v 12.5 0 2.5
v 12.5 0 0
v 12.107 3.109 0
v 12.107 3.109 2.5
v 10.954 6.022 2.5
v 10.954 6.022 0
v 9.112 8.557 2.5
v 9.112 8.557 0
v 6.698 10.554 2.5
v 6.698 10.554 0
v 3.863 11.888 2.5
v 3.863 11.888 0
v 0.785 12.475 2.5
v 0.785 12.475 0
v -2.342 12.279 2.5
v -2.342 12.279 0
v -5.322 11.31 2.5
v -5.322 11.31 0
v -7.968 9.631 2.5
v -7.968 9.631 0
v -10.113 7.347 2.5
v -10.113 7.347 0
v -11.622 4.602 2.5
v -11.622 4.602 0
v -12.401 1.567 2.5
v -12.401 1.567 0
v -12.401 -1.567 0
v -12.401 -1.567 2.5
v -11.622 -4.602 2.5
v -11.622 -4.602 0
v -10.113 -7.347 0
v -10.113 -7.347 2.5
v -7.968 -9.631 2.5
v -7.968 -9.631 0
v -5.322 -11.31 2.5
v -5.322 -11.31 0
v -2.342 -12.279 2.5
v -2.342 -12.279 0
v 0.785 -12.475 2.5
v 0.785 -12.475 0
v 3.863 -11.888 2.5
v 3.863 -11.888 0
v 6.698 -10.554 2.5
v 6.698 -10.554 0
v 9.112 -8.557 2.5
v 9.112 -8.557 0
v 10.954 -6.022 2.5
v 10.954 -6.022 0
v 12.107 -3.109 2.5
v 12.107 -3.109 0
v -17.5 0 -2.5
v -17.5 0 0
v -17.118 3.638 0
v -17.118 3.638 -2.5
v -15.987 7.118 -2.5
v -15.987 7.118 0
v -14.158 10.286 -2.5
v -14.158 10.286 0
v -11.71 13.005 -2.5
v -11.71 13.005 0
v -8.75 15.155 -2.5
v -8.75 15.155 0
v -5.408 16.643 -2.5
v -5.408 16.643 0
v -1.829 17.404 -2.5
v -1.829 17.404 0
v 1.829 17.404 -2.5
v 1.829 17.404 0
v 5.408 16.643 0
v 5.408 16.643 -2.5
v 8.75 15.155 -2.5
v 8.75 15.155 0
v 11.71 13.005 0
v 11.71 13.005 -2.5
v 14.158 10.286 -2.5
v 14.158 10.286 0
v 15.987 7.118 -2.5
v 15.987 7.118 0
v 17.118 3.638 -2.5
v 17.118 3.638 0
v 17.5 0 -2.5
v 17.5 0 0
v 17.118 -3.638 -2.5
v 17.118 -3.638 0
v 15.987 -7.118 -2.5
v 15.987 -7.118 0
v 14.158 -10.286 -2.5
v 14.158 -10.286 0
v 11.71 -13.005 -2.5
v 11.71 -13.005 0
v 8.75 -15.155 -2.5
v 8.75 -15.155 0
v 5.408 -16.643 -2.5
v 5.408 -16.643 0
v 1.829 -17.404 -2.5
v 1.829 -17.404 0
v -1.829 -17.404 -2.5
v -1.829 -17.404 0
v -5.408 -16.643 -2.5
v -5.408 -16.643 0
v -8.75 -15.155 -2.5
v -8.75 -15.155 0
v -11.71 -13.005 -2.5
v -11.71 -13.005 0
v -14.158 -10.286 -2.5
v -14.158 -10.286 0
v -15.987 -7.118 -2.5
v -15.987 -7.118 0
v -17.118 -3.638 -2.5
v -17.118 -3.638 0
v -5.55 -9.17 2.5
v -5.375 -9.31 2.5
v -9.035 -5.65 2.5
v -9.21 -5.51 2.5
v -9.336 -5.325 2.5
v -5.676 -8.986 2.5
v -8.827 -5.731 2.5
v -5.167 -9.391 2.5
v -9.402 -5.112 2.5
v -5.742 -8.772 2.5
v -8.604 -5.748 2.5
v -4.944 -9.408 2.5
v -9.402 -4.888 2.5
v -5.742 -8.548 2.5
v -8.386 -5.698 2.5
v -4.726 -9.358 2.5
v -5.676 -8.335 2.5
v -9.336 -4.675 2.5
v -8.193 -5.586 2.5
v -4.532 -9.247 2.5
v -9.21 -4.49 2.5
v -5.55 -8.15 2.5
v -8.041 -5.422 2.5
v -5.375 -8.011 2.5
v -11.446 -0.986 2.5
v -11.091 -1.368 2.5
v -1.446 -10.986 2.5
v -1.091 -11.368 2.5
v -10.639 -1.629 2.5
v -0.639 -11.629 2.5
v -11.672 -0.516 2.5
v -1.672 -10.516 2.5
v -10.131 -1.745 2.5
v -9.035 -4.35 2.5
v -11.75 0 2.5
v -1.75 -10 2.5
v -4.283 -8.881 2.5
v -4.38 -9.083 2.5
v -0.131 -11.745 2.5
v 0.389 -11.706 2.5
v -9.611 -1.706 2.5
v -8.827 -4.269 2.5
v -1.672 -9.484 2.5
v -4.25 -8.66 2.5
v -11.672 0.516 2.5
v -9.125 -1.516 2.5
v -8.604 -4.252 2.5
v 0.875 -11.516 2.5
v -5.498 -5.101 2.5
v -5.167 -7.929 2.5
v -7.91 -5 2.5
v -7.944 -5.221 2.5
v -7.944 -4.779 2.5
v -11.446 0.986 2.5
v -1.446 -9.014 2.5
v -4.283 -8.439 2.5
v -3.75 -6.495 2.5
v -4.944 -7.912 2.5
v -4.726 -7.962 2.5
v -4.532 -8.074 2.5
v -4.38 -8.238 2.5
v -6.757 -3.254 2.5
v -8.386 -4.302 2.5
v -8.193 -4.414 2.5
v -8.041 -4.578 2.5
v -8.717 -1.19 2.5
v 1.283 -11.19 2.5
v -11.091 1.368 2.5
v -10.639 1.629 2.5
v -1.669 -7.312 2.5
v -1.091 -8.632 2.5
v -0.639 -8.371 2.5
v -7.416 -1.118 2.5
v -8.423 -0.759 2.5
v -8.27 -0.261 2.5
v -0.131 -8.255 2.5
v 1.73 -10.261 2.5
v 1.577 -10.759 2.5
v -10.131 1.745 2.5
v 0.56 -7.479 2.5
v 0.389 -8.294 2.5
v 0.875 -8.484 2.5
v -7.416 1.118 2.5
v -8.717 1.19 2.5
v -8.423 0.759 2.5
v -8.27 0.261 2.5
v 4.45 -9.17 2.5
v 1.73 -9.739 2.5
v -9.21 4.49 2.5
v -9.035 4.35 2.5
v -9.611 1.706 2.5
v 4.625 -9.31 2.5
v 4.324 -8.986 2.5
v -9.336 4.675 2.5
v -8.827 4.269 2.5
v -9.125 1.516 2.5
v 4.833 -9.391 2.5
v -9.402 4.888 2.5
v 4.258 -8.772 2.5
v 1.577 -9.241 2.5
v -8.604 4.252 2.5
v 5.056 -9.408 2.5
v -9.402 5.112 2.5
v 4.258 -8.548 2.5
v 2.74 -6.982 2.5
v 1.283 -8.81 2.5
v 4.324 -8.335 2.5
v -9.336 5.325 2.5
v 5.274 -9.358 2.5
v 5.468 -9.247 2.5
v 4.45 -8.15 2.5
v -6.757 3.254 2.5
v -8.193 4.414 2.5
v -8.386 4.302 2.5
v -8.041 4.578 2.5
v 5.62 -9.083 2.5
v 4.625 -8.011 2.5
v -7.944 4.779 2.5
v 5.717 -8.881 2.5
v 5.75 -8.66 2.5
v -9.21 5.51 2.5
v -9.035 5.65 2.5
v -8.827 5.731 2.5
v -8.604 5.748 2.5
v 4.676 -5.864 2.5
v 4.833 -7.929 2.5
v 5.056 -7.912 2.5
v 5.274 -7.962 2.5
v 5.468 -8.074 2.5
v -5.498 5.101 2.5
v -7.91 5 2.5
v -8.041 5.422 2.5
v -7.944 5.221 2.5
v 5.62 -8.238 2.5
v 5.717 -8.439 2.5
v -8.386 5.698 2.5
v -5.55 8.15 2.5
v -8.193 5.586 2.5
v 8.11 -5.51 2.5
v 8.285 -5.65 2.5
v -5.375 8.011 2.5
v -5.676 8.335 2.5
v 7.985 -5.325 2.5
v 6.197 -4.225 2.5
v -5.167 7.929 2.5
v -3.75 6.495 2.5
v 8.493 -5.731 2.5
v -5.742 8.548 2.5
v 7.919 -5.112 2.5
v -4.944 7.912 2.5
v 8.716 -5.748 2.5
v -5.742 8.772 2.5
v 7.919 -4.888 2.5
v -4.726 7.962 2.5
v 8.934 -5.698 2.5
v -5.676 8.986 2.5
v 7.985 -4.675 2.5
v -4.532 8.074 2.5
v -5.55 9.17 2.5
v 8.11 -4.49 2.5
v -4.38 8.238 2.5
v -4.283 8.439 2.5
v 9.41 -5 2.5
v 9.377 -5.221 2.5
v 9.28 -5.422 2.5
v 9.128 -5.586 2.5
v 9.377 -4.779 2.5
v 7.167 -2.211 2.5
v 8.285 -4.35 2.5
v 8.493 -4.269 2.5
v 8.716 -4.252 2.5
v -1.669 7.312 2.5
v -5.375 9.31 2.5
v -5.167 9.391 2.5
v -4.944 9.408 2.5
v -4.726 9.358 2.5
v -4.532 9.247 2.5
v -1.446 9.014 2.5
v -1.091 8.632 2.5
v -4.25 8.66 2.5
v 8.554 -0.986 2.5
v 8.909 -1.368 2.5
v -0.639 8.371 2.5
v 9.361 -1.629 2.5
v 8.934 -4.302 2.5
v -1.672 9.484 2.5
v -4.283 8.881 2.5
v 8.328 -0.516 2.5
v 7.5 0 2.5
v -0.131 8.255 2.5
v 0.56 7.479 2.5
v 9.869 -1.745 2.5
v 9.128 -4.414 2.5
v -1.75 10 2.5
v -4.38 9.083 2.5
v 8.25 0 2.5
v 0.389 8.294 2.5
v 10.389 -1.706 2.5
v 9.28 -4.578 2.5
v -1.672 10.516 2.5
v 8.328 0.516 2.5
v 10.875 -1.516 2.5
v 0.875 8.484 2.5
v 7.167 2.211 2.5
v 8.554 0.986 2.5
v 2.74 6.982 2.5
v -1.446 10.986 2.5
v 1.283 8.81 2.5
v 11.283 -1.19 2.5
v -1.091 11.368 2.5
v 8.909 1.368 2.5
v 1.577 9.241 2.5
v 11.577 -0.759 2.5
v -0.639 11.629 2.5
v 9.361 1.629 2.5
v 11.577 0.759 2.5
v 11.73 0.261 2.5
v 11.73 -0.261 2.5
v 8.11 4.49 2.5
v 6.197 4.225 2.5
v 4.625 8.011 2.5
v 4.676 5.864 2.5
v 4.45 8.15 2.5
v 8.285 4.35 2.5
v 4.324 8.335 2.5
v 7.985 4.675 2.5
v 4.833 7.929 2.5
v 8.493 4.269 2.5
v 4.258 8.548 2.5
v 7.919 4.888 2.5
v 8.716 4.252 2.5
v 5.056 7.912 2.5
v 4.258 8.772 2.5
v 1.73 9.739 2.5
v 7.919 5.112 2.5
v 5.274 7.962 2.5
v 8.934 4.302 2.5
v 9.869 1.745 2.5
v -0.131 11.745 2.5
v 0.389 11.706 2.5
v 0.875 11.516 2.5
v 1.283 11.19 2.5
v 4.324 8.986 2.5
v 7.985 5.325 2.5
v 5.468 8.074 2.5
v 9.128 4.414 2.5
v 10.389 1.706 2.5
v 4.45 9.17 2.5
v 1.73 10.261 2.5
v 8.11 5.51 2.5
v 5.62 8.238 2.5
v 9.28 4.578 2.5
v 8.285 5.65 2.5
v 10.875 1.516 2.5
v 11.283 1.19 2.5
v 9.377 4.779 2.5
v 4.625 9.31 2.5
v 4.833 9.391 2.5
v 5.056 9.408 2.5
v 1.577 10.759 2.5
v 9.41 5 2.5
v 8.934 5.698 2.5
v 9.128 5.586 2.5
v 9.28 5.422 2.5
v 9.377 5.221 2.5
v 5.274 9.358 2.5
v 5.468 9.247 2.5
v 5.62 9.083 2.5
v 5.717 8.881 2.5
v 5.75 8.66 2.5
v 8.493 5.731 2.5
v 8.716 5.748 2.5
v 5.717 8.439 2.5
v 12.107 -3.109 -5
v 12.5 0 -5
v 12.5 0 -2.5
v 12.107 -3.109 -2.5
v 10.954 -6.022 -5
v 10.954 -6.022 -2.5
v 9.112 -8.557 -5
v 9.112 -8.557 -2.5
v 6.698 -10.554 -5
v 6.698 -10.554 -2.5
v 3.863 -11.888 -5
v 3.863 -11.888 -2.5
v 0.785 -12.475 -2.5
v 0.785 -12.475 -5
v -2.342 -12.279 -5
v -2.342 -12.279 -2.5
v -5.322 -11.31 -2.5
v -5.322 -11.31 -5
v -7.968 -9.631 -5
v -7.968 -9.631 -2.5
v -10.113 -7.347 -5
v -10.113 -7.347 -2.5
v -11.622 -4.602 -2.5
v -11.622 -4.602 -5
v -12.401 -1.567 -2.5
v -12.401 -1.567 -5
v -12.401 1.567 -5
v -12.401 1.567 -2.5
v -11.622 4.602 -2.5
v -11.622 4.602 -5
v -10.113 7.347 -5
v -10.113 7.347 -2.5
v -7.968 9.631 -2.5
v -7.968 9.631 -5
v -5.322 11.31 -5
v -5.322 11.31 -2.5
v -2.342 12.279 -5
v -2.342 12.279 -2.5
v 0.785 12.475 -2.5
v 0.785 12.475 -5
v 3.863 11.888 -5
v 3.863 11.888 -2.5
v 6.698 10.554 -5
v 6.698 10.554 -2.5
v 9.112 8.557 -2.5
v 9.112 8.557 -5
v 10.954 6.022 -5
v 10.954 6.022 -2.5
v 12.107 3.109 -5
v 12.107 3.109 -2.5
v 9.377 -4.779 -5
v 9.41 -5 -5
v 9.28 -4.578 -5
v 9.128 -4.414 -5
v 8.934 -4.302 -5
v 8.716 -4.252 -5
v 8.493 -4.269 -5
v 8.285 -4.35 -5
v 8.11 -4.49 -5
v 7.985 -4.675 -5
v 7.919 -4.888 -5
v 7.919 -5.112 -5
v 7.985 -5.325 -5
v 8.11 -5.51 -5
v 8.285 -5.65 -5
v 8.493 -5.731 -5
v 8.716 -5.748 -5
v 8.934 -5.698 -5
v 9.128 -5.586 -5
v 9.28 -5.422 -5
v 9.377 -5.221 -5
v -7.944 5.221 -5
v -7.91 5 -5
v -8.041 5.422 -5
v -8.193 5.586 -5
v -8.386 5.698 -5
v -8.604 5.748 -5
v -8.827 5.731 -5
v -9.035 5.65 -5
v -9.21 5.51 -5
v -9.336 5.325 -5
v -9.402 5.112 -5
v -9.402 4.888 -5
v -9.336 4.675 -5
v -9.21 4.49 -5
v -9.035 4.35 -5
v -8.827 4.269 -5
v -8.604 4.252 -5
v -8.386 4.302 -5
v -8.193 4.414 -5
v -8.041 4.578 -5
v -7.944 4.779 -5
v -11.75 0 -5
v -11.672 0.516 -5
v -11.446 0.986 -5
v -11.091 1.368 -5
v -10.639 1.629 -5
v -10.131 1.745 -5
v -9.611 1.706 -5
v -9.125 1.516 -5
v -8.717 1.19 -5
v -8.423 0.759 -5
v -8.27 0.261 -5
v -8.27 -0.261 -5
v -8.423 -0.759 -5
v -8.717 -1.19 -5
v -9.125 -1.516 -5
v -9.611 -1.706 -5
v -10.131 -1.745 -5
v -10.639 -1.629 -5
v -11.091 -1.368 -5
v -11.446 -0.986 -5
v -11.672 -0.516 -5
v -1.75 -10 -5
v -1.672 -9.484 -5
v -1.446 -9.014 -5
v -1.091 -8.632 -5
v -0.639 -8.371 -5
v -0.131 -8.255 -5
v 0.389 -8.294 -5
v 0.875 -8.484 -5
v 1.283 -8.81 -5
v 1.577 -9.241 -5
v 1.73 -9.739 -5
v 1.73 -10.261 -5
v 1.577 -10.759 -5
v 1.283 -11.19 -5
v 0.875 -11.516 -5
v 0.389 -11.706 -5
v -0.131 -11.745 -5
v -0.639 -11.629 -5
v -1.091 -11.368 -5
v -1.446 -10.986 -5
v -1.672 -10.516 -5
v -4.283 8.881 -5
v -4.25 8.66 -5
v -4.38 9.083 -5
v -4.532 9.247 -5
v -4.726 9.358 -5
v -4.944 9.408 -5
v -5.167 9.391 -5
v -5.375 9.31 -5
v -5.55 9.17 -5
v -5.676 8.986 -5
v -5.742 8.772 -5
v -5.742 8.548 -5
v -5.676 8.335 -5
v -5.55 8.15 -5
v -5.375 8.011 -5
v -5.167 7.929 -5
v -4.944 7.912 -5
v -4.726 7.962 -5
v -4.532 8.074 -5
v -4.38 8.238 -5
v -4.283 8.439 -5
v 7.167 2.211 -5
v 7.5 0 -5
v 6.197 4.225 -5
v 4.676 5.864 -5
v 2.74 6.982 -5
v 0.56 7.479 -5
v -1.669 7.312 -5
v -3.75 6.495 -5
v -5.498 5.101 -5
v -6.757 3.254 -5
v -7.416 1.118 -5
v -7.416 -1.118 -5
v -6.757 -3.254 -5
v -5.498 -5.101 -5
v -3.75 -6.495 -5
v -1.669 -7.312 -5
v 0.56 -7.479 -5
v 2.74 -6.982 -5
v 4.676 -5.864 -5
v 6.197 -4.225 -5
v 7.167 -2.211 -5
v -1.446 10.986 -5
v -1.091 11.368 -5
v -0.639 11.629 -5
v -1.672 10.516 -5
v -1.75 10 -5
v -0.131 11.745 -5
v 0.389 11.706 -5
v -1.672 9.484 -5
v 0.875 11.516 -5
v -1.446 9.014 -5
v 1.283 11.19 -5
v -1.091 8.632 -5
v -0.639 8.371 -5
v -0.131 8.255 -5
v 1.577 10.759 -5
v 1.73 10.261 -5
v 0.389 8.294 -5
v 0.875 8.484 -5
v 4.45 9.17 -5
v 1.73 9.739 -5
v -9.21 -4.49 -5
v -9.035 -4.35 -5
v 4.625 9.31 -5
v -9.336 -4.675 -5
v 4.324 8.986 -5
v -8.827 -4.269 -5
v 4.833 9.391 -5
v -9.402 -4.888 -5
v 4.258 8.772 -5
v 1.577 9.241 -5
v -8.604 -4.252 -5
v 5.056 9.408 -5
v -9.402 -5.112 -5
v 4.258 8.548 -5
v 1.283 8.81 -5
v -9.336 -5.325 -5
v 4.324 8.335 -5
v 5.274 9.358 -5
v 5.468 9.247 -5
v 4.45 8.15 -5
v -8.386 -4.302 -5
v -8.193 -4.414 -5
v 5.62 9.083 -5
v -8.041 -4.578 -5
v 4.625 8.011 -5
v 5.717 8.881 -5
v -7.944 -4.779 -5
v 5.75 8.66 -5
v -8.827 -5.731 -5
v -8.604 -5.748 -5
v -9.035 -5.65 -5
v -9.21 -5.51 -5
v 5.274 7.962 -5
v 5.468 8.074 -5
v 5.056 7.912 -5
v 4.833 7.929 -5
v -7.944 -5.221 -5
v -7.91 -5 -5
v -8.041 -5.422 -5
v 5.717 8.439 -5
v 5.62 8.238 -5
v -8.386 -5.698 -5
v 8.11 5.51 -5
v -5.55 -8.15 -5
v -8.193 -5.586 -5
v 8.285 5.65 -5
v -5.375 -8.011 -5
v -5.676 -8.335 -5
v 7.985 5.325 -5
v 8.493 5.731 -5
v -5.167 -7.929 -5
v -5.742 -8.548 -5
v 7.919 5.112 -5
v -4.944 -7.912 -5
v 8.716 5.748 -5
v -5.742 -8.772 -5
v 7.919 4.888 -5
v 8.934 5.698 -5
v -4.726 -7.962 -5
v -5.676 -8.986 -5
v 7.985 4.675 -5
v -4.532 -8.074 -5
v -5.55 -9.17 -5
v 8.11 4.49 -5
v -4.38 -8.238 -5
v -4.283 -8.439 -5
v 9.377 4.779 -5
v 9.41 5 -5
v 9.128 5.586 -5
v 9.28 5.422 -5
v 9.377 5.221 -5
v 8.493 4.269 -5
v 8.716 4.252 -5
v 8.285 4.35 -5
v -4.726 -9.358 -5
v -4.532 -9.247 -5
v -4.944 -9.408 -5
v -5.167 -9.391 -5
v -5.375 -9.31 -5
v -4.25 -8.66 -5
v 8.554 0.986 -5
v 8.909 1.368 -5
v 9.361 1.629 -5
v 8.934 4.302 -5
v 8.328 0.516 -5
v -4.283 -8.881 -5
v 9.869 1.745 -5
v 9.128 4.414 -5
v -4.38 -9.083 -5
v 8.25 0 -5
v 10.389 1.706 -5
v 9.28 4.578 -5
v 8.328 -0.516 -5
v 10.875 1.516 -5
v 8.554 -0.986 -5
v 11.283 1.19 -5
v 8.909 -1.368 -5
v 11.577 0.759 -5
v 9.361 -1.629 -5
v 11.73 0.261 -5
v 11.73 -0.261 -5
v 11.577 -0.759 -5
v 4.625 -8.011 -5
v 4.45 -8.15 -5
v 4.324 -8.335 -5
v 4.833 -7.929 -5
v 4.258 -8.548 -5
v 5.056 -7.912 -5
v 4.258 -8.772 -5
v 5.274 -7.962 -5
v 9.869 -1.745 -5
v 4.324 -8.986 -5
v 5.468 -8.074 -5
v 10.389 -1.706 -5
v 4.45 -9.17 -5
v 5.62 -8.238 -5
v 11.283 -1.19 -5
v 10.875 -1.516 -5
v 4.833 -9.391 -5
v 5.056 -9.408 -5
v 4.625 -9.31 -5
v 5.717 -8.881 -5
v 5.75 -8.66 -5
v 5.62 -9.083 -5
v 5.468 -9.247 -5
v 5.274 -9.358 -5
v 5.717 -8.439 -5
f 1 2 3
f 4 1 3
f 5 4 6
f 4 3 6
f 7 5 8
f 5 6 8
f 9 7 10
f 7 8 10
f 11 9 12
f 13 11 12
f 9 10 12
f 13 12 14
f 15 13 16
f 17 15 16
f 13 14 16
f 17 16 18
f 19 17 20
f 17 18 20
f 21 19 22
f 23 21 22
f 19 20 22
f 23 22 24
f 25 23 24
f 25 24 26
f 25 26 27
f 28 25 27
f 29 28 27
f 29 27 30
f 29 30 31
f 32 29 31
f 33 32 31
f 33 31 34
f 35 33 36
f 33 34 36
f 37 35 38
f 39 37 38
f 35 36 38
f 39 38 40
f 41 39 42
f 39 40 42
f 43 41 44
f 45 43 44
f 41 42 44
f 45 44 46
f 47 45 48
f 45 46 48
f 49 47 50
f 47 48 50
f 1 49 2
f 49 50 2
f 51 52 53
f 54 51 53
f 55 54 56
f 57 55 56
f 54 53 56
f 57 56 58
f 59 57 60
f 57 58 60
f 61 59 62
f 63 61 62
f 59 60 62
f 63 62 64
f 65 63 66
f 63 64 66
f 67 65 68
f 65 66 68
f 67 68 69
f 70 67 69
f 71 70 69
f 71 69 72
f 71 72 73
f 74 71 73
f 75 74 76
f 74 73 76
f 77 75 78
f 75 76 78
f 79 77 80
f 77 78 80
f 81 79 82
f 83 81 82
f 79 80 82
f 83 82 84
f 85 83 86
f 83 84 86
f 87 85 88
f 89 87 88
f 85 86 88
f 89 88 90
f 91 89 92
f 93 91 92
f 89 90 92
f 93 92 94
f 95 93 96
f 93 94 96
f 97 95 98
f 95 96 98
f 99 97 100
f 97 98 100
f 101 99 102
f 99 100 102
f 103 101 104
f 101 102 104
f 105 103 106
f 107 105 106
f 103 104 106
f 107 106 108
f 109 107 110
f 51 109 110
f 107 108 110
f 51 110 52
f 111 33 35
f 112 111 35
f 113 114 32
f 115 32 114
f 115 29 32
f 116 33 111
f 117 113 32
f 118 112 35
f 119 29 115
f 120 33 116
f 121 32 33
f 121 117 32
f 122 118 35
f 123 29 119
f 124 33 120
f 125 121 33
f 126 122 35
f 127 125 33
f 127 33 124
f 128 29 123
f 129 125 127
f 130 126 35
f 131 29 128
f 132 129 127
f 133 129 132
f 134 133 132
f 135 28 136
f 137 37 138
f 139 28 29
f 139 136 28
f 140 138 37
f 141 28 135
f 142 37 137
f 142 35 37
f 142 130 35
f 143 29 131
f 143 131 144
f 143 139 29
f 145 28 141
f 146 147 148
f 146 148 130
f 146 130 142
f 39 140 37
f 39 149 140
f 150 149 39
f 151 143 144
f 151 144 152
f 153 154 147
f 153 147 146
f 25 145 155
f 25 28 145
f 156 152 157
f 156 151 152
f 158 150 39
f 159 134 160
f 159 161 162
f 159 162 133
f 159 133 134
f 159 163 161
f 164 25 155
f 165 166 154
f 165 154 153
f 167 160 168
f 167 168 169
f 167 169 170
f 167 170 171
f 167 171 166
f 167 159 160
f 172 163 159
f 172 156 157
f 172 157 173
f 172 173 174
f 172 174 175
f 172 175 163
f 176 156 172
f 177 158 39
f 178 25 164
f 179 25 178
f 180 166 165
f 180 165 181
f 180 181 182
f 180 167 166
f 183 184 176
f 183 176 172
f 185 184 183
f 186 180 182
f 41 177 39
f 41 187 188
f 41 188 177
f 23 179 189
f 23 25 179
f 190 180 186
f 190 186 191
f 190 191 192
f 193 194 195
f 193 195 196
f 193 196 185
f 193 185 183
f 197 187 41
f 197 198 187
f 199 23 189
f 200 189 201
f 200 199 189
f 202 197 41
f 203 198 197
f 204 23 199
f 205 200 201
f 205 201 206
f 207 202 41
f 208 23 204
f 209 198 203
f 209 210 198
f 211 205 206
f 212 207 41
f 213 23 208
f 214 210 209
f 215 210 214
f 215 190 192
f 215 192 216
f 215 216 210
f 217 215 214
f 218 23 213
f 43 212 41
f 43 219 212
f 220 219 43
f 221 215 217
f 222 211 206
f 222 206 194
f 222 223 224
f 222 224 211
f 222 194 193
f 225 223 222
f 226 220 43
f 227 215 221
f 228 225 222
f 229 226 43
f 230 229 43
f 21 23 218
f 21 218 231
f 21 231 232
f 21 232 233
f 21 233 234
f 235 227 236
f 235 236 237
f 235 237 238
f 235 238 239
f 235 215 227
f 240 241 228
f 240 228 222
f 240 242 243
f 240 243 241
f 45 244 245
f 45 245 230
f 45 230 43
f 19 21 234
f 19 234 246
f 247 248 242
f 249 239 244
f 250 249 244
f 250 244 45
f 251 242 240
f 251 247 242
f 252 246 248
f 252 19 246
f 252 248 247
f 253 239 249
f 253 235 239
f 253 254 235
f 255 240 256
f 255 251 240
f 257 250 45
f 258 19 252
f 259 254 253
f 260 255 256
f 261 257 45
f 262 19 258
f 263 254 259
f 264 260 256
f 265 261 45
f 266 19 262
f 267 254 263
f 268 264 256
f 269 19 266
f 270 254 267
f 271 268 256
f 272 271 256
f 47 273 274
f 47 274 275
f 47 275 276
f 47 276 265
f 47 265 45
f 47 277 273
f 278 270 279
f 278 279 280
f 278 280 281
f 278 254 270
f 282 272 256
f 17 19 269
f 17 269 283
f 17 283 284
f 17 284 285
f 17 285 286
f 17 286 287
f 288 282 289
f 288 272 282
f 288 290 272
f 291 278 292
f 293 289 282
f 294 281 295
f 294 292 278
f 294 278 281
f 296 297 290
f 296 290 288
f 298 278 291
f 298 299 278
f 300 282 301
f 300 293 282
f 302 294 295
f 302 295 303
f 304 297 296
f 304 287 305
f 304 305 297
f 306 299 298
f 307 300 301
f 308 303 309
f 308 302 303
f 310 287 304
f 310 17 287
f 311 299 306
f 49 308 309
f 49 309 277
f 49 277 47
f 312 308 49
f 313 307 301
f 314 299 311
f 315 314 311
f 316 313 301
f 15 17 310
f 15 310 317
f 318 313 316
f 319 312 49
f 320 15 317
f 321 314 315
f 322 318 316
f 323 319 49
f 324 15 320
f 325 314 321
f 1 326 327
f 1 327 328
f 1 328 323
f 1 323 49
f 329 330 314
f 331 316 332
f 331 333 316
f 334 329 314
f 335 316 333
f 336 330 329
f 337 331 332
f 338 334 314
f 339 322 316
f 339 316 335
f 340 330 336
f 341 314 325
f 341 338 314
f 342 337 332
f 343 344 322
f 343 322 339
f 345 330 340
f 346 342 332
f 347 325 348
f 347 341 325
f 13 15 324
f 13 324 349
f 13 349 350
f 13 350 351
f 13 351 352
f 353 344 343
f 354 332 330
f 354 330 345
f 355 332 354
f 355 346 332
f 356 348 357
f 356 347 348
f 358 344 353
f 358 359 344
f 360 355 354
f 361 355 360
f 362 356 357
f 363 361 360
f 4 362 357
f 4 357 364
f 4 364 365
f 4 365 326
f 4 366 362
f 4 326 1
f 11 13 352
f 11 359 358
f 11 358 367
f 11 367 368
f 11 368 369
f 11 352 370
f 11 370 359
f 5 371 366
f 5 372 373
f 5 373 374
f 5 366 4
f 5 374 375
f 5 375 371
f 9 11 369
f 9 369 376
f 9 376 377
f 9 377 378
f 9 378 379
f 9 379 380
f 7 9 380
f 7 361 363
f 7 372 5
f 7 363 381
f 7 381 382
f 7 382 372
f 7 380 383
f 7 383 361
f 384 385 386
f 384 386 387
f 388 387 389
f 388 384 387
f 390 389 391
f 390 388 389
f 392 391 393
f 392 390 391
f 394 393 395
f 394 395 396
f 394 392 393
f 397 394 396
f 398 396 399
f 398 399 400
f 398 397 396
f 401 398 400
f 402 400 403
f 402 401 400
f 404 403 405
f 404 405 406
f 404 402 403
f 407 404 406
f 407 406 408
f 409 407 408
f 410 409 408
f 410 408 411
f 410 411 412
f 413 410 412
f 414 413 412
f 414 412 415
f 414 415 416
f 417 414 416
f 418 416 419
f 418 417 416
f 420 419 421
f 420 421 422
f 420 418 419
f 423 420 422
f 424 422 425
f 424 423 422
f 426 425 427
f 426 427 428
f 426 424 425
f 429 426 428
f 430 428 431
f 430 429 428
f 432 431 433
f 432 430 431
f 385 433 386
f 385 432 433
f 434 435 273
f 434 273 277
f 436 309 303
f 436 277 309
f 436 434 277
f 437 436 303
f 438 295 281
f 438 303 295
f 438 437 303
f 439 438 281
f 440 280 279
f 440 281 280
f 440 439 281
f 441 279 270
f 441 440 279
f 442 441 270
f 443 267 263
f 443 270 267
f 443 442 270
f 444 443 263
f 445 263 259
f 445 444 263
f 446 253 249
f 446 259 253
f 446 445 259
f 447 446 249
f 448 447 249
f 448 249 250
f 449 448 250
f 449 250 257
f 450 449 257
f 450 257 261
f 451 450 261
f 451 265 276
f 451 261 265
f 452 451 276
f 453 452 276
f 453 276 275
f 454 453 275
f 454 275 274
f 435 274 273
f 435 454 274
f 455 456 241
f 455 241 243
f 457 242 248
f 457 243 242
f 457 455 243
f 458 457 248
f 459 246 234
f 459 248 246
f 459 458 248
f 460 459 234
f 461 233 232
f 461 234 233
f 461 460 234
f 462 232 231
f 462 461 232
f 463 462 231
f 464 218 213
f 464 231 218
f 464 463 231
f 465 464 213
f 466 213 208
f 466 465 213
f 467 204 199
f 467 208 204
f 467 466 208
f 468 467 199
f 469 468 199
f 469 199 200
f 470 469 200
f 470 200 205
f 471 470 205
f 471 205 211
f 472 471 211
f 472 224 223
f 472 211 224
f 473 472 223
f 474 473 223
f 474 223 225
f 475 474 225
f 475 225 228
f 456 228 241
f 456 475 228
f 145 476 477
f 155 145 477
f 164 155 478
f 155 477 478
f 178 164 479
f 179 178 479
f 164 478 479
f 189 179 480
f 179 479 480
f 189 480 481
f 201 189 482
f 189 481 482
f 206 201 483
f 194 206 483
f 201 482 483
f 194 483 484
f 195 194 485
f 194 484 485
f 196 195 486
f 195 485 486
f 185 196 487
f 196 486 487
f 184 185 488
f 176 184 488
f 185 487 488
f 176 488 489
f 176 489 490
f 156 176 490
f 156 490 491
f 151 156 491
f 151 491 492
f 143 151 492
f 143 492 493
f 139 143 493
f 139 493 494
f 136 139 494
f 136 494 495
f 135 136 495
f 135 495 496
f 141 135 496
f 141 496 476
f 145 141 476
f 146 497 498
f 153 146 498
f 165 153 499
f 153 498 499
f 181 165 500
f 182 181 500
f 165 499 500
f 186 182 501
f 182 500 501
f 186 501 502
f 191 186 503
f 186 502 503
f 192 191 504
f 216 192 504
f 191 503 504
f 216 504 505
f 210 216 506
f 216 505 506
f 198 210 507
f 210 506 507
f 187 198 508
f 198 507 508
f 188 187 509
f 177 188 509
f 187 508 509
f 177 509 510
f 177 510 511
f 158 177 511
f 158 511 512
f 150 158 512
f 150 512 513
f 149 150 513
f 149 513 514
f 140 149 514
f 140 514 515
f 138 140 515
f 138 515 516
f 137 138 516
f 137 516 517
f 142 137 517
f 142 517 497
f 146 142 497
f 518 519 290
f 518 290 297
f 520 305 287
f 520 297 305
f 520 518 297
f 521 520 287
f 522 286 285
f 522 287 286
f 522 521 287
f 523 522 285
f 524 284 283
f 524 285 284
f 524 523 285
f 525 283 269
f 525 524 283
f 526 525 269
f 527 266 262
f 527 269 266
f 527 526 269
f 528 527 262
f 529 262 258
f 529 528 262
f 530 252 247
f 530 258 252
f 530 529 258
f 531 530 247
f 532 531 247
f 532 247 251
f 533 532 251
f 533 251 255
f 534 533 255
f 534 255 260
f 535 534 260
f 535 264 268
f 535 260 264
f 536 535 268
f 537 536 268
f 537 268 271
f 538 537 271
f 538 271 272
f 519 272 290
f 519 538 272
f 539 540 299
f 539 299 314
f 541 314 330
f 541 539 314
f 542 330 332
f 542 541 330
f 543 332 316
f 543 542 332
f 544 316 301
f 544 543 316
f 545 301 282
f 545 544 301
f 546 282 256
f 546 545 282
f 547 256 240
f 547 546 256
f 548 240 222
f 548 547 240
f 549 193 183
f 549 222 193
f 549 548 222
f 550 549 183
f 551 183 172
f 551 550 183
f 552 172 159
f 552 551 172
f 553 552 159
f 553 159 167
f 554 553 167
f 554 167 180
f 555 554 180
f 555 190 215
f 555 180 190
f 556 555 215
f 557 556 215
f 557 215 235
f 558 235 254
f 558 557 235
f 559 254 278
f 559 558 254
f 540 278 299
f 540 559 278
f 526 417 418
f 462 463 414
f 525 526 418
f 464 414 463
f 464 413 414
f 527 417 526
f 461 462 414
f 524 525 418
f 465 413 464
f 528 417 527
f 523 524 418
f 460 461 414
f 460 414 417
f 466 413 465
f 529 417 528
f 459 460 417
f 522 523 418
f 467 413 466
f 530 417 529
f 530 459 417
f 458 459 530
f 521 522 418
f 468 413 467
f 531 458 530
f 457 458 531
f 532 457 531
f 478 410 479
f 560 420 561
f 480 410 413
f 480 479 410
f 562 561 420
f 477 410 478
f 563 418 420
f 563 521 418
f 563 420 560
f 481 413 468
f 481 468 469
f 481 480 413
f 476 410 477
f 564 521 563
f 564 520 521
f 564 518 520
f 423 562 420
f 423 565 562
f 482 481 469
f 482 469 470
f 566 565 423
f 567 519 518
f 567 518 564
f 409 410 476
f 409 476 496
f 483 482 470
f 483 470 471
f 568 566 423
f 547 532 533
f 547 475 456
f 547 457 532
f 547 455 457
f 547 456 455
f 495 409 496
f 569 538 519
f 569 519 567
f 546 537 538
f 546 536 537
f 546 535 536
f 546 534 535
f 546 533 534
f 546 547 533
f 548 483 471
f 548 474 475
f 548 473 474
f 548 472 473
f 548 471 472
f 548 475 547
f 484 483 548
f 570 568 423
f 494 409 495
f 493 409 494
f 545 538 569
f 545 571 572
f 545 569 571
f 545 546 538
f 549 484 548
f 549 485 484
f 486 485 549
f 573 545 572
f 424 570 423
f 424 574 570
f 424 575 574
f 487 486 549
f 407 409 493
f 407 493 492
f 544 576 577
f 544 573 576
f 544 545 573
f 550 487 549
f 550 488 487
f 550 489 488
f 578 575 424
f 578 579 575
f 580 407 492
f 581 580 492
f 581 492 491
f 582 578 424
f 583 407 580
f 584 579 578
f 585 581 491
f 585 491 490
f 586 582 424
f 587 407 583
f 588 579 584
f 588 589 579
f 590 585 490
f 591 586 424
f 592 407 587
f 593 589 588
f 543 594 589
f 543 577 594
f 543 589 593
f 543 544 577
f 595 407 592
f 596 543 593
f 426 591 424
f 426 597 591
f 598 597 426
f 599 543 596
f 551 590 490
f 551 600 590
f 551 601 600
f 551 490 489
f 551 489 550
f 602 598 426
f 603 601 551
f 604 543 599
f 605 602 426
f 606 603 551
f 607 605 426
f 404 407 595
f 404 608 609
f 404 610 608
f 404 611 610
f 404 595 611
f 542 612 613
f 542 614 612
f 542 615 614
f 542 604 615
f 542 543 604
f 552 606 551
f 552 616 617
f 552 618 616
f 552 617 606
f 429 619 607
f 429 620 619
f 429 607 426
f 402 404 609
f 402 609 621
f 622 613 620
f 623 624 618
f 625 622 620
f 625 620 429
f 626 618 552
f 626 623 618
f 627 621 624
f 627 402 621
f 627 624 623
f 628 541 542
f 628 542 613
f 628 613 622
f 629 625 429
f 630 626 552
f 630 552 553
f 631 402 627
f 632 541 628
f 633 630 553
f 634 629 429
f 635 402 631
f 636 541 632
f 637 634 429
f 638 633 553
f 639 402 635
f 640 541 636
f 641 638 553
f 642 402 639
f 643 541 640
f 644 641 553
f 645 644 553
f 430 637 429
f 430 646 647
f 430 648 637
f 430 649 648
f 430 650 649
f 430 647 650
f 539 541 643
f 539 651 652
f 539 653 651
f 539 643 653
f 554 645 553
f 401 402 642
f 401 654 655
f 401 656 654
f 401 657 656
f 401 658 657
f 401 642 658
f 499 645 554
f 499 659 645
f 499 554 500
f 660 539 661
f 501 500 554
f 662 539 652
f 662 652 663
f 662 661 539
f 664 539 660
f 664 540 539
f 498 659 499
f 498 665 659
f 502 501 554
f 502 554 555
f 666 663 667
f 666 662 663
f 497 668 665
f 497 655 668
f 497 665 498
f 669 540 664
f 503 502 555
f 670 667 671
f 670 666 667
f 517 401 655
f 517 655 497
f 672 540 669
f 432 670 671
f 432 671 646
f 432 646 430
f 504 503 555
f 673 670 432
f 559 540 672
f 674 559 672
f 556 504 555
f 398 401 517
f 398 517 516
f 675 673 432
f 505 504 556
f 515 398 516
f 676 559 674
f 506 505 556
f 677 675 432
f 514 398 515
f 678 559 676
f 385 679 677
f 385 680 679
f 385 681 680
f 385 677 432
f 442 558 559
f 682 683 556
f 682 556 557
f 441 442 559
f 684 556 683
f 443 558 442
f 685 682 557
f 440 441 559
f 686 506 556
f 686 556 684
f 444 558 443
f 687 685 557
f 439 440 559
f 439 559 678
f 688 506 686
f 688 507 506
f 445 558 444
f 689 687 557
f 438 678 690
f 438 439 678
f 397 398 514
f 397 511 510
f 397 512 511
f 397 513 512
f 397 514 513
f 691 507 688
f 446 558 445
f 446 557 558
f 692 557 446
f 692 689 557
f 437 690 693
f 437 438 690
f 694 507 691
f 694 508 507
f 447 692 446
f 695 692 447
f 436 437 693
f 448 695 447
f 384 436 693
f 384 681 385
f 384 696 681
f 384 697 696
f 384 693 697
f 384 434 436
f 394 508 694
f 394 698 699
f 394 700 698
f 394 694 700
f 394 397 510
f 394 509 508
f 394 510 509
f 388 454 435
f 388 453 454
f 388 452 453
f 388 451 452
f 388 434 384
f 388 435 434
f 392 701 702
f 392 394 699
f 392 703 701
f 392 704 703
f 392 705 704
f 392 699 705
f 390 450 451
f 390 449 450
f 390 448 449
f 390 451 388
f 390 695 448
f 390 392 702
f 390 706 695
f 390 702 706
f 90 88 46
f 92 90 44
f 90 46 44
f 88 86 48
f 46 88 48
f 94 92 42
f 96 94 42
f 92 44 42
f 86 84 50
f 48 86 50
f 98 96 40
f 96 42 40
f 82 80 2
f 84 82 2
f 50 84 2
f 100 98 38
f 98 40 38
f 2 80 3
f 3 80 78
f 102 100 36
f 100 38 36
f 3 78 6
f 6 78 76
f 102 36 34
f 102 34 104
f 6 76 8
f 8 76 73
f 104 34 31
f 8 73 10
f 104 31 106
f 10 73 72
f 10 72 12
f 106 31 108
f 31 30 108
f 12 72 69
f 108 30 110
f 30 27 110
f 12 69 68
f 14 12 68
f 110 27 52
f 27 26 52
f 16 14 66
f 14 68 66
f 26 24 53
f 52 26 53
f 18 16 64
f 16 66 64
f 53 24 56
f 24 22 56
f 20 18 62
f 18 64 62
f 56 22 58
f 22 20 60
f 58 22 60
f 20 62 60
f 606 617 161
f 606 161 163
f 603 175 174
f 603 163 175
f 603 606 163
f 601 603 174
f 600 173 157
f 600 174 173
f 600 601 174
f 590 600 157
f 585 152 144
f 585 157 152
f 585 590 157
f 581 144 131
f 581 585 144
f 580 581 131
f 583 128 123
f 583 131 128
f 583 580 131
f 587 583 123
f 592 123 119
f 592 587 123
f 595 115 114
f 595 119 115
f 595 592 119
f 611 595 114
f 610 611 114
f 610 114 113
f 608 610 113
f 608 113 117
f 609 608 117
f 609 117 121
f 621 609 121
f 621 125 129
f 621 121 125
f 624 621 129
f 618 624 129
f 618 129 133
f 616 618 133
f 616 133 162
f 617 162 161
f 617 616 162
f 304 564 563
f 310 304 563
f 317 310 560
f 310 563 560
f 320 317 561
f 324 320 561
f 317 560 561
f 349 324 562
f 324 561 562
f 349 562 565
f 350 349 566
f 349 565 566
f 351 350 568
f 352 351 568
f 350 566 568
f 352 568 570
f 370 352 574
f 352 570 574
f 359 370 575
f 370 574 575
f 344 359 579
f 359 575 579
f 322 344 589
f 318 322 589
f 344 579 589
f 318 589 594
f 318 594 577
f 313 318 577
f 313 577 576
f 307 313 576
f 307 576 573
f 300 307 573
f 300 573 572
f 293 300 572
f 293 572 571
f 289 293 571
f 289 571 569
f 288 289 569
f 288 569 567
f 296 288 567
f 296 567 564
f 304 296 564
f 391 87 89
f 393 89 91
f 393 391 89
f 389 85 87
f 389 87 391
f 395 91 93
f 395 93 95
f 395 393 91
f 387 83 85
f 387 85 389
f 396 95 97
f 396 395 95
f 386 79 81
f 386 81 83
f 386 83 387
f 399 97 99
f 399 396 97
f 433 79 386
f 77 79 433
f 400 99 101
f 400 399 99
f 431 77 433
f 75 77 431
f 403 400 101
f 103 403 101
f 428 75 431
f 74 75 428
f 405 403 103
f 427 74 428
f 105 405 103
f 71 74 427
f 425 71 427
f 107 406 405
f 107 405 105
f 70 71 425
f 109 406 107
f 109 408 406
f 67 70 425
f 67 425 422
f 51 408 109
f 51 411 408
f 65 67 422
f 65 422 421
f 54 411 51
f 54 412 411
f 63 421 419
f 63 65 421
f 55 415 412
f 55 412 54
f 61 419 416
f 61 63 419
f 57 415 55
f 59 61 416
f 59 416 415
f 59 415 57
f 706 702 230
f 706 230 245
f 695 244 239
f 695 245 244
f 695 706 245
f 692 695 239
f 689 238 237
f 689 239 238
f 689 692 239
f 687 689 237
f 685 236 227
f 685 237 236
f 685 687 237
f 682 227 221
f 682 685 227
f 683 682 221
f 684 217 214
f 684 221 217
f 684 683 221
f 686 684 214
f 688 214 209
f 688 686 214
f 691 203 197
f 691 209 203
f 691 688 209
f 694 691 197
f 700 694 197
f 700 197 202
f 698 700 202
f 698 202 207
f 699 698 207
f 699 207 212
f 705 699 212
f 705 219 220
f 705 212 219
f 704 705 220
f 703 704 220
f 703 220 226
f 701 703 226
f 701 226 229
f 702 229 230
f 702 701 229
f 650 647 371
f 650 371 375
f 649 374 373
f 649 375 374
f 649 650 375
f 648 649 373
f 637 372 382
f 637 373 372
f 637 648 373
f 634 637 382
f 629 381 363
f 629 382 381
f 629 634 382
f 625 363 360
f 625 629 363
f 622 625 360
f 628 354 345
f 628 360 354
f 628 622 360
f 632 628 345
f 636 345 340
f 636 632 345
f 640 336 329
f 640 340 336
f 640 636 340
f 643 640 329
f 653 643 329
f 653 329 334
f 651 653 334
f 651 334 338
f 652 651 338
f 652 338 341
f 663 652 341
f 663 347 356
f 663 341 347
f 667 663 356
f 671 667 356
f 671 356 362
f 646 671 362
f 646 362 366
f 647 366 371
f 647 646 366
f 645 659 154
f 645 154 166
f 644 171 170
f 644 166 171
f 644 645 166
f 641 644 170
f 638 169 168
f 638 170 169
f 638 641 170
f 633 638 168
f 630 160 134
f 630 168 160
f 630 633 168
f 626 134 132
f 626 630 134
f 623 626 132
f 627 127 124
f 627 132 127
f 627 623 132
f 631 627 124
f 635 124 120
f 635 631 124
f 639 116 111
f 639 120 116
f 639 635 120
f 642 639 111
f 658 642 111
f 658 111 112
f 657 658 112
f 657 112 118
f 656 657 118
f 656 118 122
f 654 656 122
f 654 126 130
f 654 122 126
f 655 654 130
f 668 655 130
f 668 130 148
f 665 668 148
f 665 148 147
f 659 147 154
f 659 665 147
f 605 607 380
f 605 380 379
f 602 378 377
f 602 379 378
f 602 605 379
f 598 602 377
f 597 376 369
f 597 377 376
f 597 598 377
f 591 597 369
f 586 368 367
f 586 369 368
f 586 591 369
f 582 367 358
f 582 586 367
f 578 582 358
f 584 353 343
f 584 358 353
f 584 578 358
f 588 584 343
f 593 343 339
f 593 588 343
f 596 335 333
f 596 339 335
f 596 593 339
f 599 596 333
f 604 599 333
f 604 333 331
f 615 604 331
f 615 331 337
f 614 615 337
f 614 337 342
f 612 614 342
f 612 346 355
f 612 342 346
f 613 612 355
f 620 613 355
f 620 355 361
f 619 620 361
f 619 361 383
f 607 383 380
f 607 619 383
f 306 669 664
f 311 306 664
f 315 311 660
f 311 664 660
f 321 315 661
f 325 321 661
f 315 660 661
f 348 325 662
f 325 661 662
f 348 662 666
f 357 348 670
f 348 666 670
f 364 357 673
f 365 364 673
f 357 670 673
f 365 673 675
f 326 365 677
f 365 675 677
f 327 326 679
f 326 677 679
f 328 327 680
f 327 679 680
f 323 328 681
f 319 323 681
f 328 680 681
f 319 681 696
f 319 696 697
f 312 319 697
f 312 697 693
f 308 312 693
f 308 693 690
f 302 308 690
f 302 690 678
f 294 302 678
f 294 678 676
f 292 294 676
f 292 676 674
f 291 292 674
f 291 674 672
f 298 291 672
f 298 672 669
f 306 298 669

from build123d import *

# Parameters (mm, degrees)
SKETCH1_R               = 12.5
BOSS_EXTRUDE1_DEPTH     = 2.5
SKETCH3_R               = 17.5
BOSS_EXTRUDE2_DEPTH     = 2.5
BOSS_EXTRUDE3_START     = 2.5
SKETCH5_R               = 12.5
BOSS_EXTRUDE3_DEPTH     = 2.5
CUT_EXTRUDE1_DEPTH      = 26.860201082
CUT_EXTRUDE1_DEPTH_BACK = 26.860201082
SKETCH2_R               = 0.75
SKETCH2_R_2             = 7.5
SKETCH6_R               = 1.75
CUT_EXTRUDE2_DEPTH      = 10


with BuildPart() as part:
    # Sketch1 → Boss-Extrude1 (new body)
    with BuildSketch(Plane.XY):
        Circle(SKETCH1_R)
    extrude(amount=BOSS_EXTRUDE1_DEPTH)

    # Sketch3 → Boss-Extrude2 (add)
    with BuildSketch(Plane(origin=(0, 0, 0), x_dir=(-1, 0, 0), z_dir=(0, 0, -1))):
        Circle(SKETCH3_R)
    extrude(amount=BOSS_EXTRUDE2_DEPTH)

    # Sketch5 → Boss-Extrude3 (add)
    with BuildSketch(Plane(origin=(0, 0, -2.5), x_dir=(-1, 0, 0), z_dir=(0, 0, -1)).offset(BOSS_EXTRUDE3_START)):
        with Locations(Location((0, 0, 0), (0, 0, 180))):
            Circle(SKETCH5_R)
    extrude(amount=-BOSS_EXTRUDE3_DEPTH)

    # Sketch2 → Cut-Extrude1 (cut, two sides: drawn at the far end of the back side and taken through both)
    with BuildSketch(Plane.XY.offset(2.5).offset(-CUT_EXTRUDE1_DEPTH_BACK)):
        with Locations((0, 10)):
            Circle(SKETCH2_R)
        with Locations((5, 8.660254038)):
            Circle(SKETCH2_R)
        with Locations((8.660254038, 5)):
            Circle(SKETCH2_R)
        with Locations((10, 0)):
            Circle(SKETCH2_R)
        with Locations((8.660254038, -5)):
            Circle(SKETCH2_R)
        with Locations((5, -8.660254038)):
            Circle(SKETCH2_R)
        with Locations((0, -10)):
            Circle(SKETCH2_R)
        with Locations((-5, -8.660254038)):
            Circle(SKETCH2_R)
        with Locations((-8.660254038, -5)):
            Circle(SKETCH2_R)
        with Locations((-10, 0)):
            Circle(SKETCH2_R)
        with Locations((-8.660254038, 5)):
            Circle(SKETCH2_R)
        with Locations((-5, 8.660254038)):
            Circle(SKETCH2_R)
        Circle(SKETCH2_R_2)
    extrude(amount=CUT_EXTRUDE1_DEPTH + CUT_EXTRUDE1_DEPTH_BACK, mode=Mode.SUBTRACT)

    # Sketch6 → Cut-Extrude2 (cut)
    with BuildSketch(Plane(origin=(0, 0, -5), x_dir=(-1, 0, 0), z_dir=(0, 0, -1))):
        with Locations((0, 10)):
            Circle(SKETCH6_R)
        with Locations((10, 0)):
            Circle(SKETCH6_R)
        with Locations((0, -10)):
            Circle(SKETCH6_R)
        with Locations((-10, 0)):
            Circle(SKETCH6_R)
    extrude(amount=-CUT_EXTRUDE2_DEPTH, mode=Mode.SUBTRACT)


solid = part.part
